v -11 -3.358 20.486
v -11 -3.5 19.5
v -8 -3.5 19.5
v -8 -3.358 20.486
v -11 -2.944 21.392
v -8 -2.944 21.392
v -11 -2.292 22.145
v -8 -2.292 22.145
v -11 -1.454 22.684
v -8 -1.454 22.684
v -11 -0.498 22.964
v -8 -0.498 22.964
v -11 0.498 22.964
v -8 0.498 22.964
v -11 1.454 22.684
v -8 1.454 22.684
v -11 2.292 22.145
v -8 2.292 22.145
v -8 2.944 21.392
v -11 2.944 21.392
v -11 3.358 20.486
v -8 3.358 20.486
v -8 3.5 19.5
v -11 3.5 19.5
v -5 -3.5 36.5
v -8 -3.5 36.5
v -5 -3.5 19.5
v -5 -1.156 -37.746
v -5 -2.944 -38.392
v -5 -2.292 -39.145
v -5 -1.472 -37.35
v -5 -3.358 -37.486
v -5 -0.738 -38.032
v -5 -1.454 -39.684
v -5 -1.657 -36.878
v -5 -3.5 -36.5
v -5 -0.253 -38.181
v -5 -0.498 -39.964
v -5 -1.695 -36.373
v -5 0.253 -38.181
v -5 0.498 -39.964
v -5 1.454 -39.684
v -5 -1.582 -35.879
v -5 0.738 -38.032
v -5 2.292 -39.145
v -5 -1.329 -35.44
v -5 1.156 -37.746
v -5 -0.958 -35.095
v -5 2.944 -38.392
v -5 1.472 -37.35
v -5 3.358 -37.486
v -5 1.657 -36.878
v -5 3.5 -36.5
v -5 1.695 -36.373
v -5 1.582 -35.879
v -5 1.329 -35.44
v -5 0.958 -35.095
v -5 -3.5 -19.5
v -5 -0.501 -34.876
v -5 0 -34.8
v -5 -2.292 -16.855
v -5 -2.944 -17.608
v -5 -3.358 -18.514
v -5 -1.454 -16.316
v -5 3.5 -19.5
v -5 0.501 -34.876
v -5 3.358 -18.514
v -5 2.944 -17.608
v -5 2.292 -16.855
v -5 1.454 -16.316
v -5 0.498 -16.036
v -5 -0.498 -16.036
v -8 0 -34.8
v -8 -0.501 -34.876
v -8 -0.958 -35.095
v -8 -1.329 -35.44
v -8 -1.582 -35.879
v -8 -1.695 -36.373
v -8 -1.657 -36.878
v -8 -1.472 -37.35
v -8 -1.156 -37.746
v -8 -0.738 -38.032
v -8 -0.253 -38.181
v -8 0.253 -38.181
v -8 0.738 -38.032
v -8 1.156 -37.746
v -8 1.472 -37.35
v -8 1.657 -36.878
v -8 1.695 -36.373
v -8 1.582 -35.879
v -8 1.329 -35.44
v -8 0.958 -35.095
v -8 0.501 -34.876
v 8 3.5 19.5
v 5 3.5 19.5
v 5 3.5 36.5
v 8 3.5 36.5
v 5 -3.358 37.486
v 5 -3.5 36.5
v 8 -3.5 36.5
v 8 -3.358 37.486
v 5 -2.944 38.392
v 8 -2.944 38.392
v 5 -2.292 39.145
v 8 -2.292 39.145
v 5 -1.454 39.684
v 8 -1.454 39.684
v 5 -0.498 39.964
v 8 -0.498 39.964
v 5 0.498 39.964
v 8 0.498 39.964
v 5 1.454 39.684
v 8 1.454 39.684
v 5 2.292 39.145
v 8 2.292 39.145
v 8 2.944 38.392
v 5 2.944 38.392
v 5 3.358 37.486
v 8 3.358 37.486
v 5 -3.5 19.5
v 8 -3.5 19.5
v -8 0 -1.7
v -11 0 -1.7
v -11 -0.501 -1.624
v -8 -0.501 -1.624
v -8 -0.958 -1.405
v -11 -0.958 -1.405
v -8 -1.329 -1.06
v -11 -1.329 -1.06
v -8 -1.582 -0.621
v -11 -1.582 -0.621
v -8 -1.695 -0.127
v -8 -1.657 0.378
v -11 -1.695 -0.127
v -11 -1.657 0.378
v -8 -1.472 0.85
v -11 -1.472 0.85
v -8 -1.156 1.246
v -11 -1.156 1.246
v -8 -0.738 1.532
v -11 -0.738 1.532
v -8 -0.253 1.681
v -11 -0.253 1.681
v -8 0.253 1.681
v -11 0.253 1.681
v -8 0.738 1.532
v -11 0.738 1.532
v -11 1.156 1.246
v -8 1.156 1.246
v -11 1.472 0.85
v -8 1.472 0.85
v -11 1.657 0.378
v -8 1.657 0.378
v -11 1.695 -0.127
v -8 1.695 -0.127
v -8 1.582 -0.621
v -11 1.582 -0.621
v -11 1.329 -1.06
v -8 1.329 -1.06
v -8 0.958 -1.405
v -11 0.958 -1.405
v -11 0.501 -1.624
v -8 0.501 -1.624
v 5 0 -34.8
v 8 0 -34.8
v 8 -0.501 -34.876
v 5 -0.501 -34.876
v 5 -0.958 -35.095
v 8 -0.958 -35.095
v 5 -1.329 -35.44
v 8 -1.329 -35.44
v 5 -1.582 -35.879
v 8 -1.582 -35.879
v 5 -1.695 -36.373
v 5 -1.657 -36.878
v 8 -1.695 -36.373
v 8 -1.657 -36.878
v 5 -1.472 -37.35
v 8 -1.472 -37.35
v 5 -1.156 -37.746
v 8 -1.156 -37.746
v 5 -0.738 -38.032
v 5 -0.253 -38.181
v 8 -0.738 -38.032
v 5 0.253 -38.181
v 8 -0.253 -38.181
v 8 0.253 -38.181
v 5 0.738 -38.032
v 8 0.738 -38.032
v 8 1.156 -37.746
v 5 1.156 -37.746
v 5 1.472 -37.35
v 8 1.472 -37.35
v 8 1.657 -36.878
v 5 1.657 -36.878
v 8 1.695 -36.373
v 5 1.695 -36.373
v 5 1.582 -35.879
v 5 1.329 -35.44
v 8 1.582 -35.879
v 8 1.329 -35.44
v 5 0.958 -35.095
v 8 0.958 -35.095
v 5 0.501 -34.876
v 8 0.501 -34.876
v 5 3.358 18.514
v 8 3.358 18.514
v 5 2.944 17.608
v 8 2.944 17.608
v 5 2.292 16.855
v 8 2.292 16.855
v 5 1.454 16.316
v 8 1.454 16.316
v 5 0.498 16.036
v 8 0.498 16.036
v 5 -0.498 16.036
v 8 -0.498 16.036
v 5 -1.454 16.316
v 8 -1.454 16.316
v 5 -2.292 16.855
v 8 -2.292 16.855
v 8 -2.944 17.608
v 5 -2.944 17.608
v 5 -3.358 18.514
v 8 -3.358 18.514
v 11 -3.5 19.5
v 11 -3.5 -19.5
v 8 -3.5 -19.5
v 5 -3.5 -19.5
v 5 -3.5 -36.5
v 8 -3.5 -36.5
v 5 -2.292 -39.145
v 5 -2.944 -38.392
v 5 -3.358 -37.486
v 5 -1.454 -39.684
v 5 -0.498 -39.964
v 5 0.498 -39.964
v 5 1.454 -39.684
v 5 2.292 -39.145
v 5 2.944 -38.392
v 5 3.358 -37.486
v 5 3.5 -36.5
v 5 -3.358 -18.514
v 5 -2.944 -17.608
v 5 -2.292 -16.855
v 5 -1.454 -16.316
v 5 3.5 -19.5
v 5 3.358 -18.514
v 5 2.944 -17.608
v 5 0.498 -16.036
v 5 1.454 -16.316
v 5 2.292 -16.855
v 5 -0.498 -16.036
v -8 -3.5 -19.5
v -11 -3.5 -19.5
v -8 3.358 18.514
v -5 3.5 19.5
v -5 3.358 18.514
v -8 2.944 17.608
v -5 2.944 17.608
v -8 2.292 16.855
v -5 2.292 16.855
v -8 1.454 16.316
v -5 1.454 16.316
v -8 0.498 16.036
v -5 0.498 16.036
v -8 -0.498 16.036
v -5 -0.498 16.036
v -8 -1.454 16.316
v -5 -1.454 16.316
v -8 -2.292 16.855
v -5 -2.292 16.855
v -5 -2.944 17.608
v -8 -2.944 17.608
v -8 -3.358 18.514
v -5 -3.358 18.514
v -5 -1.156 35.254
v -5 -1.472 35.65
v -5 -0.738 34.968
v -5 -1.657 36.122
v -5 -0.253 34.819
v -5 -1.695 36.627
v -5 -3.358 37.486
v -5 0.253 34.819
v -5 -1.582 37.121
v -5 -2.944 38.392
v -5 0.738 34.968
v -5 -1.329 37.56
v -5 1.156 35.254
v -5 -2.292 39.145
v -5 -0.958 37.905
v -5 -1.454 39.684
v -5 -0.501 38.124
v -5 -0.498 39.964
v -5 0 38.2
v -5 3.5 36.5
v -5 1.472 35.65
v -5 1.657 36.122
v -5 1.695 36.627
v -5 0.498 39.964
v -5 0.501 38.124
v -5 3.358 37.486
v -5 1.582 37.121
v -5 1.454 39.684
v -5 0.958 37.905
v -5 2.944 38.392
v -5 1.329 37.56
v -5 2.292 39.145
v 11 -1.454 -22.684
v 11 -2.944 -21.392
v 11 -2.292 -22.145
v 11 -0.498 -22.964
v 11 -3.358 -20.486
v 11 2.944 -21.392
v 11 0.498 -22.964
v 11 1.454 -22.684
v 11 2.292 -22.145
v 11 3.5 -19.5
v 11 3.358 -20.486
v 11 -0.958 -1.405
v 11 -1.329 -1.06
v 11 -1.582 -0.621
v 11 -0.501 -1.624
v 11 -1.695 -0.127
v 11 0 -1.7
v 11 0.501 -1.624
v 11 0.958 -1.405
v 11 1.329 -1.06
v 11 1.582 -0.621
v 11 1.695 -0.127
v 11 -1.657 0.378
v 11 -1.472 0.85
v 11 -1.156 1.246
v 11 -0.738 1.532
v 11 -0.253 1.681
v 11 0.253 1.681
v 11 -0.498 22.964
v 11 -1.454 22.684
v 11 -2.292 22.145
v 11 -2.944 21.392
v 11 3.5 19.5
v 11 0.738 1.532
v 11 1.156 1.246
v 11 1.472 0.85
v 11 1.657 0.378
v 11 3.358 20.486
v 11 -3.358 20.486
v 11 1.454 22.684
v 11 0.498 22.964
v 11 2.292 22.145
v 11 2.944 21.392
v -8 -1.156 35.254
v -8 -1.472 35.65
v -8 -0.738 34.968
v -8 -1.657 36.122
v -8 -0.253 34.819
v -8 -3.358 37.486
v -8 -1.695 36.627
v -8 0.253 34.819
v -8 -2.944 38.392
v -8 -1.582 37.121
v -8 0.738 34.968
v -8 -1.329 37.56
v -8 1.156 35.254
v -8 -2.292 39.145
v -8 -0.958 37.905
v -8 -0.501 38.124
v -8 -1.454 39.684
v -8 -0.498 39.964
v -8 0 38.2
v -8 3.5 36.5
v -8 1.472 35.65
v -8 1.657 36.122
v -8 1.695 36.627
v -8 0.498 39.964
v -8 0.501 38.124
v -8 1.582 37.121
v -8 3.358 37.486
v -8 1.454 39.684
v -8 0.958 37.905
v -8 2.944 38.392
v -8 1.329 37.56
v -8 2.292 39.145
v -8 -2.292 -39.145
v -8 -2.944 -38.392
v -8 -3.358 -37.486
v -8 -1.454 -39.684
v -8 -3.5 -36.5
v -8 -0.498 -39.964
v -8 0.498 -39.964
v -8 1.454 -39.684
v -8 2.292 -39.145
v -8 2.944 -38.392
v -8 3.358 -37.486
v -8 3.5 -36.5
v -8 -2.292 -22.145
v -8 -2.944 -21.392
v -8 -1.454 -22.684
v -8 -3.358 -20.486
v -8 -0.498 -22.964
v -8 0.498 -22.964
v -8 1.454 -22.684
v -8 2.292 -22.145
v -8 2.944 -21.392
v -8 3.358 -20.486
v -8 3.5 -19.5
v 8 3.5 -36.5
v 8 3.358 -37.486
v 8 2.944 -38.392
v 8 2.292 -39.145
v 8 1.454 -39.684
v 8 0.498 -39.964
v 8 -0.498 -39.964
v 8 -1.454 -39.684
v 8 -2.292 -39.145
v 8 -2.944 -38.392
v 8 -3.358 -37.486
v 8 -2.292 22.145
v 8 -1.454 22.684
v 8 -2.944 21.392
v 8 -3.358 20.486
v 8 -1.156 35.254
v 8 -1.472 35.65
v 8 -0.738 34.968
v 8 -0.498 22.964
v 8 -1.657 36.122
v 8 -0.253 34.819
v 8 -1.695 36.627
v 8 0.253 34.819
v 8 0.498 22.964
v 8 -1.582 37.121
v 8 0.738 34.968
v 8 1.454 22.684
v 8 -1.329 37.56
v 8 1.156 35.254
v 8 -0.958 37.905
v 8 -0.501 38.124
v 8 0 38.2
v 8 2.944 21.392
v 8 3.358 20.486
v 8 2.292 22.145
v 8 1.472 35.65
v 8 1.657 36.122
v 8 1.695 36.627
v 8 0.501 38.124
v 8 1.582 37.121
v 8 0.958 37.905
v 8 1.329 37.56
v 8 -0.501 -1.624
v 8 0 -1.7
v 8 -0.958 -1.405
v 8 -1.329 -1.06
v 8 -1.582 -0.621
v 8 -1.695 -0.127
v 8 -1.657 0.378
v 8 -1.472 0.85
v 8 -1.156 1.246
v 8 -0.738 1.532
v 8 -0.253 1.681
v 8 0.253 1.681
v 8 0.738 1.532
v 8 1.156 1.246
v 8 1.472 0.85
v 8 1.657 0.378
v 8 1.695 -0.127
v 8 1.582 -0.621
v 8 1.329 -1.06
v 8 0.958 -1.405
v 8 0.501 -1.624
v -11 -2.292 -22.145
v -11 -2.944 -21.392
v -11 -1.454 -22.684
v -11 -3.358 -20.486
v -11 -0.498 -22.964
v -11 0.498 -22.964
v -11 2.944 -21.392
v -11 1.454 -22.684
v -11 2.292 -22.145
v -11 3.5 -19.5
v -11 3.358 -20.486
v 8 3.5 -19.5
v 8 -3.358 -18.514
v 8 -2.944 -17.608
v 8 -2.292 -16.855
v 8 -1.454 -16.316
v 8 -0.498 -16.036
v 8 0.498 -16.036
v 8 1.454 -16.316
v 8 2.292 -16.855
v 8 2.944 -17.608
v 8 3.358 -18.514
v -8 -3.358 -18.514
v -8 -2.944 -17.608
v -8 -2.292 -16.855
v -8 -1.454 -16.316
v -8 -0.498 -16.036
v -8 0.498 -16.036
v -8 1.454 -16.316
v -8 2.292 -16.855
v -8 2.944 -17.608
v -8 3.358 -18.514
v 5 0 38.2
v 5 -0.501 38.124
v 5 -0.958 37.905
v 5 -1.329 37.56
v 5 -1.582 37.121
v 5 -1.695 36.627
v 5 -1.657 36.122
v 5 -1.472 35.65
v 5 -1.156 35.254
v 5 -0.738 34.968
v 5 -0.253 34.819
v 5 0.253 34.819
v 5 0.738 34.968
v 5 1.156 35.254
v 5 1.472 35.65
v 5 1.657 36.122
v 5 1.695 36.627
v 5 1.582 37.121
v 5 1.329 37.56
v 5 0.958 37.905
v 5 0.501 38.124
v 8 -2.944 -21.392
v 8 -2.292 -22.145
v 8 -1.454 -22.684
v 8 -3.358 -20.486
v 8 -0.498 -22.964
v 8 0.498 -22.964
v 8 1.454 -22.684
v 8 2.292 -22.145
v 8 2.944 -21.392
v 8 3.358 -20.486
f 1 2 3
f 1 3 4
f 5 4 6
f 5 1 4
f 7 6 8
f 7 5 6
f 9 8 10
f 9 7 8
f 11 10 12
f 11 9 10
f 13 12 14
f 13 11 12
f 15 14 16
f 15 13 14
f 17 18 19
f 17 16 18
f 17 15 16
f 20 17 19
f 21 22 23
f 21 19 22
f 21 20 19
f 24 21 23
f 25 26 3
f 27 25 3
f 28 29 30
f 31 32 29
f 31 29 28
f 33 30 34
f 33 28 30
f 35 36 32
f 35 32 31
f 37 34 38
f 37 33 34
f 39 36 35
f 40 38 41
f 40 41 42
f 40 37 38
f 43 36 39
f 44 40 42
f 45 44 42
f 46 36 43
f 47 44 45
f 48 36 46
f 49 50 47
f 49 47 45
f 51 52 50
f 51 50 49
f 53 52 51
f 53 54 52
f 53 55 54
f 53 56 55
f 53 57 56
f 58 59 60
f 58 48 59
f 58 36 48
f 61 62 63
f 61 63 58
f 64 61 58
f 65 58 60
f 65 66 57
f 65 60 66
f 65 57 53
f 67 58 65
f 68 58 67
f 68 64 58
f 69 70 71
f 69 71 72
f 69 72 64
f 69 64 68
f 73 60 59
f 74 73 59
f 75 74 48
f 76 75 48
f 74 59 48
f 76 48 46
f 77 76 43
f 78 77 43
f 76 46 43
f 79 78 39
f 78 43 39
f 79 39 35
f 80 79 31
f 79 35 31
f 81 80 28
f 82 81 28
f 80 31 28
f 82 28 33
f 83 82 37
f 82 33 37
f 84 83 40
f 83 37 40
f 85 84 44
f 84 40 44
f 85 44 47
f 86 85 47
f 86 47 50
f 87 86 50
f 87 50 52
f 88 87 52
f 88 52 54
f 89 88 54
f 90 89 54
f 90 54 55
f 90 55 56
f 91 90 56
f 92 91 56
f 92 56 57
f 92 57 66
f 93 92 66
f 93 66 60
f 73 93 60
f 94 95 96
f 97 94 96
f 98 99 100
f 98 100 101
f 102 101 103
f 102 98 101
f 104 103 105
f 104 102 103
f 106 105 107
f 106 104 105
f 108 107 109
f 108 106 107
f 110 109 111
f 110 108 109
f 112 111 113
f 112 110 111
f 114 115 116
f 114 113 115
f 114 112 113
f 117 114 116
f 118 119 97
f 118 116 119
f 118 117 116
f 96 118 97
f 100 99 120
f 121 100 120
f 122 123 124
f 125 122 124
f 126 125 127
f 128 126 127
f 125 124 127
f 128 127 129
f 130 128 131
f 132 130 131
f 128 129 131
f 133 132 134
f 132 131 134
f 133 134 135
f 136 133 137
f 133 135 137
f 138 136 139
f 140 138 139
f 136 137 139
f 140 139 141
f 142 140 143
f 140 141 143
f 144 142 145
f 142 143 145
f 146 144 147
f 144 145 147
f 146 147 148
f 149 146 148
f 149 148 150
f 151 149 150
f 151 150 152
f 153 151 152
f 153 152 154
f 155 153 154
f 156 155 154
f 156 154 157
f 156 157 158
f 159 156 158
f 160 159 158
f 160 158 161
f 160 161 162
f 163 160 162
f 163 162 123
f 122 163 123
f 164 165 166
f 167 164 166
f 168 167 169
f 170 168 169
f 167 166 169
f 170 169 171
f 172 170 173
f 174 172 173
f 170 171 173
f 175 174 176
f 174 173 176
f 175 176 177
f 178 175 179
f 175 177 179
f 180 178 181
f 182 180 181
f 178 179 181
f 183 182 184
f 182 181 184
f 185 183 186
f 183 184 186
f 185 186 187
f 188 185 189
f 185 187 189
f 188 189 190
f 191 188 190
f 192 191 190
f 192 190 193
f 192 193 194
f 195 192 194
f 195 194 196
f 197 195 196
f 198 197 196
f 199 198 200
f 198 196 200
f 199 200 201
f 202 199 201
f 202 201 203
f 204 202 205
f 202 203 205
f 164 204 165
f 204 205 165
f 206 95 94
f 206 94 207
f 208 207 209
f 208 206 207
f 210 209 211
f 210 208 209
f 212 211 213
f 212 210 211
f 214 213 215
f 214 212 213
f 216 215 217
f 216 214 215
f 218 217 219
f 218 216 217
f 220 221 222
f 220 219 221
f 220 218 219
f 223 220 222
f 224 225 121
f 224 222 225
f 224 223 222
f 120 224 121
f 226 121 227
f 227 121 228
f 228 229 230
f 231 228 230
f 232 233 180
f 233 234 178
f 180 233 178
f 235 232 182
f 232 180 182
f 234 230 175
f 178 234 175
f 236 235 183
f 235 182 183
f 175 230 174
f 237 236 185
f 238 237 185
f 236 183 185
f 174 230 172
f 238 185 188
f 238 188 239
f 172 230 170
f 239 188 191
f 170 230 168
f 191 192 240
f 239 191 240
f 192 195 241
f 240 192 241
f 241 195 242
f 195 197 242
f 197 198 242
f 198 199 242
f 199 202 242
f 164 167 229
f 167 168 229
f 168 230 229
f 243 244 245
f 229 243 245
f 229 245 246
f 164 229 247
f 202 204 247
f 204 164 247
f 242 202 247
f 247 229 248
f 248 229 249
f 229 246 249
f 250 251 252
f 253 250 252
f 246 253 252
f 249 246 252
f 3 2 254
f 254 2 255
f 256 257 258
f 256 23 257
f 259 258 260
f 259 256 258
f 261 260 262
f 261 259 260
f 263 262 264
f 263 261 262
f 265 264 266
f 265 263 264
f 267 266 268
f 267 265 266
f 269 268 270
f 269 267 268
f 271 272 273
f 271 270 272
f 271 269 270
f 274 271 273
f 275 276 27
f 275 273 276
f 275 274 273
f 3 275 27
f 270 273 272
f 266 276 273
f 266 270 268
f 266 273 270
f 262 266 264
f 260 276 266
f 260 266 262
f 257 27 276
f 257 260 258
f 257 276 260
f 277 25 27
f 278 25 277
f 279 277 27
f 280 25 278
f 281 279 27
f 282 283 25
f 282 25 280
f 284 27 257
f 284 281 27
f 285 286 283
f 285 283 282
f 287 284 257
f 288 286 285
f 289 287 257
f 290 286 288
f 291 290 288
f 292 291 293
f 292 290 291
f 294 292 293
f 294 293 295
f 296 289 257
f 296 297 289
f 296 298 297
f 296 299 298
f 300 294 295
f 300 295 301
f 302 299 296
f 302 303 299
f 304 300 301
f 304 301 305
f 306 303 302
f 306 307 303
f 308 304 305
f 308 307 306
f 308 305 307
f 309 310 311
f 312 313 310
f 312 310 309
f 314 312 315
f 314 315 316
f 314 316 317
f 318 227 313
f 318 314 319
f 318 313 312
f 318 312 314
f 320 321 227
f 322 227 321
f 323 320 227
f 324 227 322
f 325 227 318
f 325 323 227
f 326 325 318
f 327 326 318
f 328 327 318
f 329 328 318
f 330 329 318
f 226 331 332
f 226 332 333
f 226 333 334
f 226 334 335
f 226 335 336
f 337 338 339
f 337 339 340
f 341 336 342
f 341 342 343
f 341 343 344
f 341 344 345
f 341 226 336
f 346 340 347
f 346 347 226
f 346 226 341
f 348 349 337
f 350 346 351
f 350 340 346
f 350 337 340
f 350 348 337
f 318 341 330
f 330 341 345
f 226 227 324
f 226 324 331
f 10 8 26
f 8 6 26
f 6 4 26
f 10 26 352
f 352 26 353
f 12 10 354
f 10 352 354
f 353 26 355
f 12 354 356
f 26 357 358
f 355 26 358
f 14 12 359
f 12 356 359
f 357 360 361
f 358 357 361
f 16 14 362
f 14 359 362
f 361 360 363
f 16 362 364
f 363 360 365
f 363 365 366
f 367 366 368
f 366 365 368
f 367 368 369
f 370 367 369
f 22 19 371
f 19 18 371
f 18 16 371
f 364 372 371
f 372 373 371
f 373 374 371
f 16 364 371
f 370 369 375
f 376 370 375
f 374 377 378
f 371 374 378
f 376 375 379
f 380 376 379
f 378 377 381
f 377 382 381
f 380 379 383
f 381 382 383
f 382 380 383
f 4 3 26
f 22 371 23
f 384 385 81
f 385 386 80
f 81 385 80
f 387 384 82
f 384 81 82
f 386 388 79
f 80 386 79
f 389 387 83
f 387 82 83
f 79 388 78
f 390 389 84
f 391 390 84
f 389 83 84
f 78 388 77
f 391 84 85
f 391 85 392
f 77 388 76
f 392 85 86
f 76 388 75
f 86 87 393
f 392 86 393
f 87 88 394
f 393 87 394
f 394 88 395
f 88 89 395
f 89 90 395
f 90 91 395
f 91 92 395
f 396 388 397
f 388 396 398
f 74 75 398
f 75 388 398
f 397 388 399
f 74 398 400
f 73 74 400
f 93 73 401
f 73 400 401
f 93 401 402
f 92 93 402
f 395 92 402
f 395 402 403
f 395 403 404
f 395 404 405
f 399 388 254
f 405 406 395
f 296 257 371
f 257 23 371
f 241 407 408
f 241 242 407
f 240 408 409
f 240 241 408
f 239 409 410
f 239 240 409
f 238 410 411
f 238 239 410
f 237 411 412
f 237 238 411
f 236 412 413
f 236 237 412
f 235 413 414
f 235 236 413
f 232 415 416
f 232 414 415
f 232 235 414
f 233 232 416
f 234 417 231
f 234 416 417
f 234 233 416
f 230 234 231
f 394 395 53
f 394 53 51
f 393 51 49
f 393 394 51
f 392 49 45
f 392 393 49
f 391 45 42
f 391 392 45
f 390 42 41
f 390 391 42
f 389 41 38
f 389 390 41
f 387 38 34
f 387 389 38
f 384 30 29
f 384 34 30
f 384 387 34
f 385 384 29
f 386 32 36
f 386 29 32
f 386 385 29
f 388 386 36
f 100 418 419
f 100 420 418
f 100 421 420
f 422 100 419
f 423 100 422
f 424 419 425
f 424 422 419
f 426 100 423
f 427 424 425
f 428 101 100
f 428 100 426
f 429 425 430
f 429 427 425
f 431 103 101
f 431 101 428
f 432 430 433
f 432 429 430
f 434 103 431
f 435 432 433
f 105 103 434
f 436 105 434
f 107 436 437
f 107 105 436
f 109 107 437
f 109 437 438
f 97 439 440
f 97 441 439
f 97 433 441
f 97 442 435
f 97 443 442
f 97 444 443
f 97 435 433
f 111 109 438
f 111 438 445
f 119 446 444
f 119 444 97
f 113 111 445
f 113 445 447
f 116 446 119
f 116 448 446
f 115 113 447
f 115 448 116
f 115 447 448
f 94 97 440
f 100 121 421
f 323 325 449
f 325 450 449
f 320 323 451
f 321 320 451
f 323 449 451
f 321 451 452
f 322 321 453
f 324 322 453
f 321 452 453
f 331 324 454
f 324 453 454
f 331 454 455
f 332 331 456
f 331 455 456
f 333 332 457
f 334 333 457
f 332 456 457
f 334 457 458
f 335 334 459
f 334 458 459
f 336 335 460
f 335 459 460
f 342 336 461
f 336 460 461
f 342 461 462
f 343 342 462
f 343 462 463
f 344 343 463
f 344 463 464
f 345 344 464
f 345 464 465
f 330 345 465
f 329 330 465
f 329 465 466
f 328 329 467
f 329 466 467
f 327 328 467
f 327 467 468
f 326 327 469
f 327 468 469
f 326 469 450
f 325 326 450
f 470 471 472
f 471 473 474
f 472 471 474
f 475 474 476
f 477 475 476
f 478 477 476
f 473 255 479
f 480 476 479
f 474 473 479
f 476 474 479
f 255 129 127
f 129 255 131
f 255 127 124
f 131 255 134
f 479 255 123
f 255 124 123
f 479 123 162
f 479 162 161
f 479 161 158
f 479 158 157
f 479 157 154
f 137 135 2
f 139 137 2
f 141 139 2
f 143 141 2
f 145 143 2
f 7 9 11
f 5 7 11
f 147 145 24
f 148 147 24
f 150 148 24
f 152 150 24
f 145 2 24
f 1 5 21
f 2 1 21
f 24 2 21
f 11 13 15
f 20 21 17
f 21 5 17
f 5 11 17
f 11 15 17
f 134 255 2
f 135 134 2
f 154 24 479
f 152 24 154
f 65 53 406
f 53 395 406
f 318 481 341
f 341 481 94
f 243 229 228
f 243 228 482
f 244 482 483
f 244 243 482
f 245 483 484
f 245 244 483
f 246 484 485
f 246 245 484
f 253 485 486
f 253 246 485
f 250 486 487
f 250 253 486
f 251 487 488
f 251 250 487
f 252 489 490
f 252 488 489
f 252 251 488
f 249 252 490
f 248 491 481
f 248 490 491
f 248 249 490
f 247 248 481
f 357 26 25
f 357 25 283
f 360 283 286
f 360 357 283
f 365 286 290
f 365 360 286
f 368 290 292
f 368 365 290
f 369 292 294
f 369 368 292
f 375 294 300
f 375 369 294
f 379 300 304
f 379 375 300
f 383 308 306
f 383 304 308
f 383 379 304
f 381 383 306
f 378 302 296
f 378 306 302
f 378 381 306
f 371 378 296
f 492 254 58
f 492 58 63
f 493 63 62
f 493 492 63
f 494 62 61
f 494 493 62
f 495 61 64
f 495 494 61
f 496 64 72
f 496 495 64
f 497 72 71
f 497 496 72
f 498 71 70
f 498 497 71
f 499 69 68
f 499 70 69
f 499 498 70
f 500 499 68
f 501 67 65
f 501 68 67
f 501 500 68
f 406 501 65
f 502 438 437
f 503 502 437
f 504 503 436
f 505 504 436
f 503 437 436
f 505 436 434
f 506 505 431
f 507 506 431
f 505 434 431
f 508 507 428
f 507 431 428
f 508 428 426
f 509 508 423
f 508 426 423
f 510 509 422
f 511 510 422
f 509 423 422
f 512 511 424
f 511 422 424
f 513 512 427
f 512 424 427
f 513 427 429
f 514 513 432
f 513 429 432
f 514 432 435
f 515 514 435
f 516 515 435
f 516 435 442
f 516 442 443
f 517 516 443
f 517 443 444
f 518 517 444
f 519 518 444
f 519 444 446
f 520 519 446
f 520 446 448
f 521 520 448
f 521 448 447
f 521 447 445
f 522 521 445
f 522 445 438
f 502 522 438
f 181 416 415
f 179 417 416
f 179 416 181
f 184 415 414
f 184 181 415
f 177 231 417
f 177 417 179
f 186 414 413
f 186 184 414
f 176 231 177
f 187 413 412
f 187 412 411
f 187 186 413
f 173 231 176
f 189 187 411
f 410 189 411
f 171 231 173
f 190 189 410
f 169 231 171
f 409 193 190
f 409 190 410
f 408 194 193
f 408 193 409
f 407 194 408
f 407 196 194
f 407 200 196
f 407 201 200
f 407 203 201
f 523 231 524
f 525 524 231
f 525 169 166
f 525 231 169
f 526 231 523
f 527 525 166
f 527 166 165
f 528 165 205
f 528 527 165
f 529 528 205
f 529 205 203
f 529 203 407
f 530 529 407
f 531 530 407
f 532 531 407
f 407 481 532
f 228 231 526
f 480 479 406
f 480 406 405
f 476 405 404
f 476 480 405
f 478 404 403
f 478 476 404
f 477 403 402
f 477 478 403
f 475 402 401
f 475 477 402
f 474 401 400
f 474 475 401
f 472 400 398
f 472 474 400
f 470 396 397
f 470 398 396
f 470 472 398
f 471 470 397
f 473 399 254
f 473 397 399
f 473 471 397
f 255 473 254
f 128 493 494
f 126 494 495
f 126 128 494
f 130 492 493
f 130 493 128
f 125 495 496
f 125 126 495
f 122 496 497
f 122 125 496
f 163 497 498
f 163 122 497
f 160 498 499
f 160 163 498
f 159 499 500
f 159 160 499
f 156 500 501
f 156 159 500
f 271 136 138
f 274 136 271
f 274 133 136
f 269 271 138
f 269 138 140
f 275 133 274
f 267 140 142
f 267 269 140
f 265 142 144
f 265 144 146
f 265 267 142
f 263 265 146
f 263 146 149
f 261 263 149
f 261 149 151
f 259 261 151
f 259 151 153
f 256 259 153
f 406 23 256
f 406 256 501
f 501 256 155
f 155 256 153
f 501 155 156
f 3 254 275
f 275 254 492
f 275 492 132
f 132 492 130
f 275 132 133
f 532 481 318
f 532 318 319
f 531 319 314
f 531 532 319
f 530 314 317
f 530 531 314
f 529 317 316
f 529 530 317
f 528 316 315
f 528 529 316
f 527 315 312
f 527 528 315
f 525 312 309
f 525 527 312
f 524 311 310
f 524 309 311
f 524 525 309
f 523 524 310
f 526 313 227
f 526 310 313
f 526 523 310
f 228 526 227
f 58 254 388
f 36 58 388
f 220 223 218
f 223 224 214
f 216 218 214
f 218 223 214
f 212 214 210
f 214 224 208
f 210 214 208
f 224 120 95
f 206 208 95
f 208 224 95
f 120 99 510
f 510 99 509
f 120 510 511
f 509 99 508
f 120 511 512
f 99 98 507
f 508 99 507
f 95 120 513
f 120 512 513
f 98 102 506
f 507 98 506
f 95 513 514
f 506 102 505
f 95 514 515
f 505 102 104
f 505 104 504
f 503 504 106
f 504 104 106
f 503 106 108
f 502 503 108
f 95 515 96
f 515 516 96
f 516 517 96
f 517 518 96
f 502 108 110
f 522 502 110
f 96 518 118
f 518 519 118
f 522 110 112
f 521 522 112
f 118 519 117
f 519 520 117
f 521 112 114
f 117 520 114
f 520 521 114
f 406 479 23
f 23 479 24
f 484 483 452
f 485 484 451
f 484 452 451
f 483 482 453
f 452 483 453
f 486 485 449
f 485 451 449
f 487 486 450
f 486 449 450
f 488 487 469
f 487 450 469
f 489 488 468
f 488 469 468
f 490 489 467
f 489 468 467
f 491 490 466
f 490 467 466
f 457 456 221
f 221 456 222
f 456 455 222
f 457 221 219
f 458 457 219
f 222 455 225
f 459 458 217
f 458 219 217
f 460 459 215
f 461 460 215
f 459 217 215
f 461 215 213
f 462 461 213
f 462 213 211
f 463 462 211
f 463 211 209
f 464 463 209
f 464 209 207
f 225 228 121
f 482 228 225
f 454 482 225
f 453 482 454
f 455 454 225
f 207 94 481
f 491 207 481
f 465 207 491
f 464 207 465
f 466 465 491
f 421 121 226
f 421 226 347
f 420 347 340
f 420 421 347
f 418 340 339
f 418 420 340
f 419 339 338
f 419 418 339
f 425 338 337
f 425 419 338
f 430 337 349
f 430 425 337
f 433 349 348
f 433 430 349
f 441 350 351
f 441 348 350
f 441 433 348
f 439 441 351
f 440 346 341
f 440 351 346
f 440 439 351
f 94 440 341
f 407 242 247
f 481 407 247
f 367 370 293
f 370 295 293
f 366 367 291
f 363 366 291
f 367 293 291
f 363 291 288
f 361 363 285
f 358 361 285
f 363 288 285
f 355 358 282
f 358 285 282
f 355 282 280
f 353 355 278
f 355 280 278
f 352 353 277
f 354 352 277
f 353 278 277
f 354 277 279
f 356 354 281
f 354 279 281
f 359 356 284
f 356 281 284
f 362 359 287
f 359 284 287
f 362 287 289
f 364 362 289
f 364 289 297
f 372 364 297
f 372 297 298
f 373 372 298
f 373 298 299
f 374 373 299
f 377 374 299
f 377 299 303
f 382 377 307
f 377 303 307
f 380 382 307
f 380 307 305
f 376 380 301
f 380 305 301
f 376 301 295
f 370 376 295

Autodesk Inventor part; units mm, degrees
ref_plane "YZ Plane" through (0, 0, 0) normal (1, 0, 0) x (0, 1, 0)
ref_plane "XZ Plane" through (0, 0, 0) normal (0, 1, 0) x (-1, 0, 0)
ref_plane "XY Plane" through (0, 0, 0) normal (0, 0, 1) x (1, 0, 0)
sketch "Sketch1" plane through (0, 0, 0) normal (1, 0, 0) x (0, 1, 0)
  line L0 (0, -36.5) -> (0, 36.5) construction
  line L1 (3.5, -36.5) -> (3.5, 36.5)
  line L2 (-3.5, 36.5) -> (-3.5, -36.5)
  arc A0 (-3.5, -36.5) -> (3.5, -36.5) centre (0, -36.5) ccw
  arc A1 (3.5, 36.5) -> (-3.5, 36.5) centre (0, 36.5) ccw
  circle A2 centre (0, 36.5) radius 1.5
  circle A3 centre (0, 0) radius 1.5
  circle A4 centre (0, -36.5) radius 1.5
  line L3 (0, -19.5) -> (0, 19.5) construction
  line L4 (3.5, -19.5) -> (3.5, 19.5)
  line L5 (-3.5, 19.5) -> (-3.5, -19.5)
  arc A5 (-3.5, -19.5) -> (3.5, -19.5) centre (0, -19.5) ccw
  arc A6 (3.5, 19.5) -> (-3.5, 19.5) centre (0, 19.5) ccw
  line L6 (0, -36.5) -> (0, -19.5) construction
  line L7 (-3.5, -36.5) -> (-3.5, -19.5)
  line L8 (3.5, -19.5) -> (3.5, -36.5)
  arc A7 (-3.5, -36.5) -> (3.5, -36.5) centre (0, -36.5) ccw
  arc A8 (3.5, -19.5) -> (-3.5, -19.5) centre (0, -19.5) ccw
  line L9 (3.5, 0) -> (-3.5, 0) construction
  line L10 (0, 36.5) -> (0, 19.5) construction
  line L11 (-3.5, 36.5) -> (-3.5, 19.5)
  line L12 (3.5, 19.5) -> (3.5, 36.5)
  arc A9 (3.5, 36.5) -> (-3.5, 36.5) centre (0, 36.5) ccw
  arc A10 (-3.5, 19.5) -> (3.5, 19.5) centre (0, 19.5) ccw
  point P0 (0, -40)
  point P1 (0, 40)
  point P2 (3.5, 19.5)
  point P3 (-3.5, 19.5)
  point P4 (3.5, -19.5)
  point P5 (0, -28)
  point P6 (0, 28)
  point P7 (3.5, 19.5)
  point P8 (-3.5, 19.5)
  point P9 (-3.5, -19.5)
  point P10 (3.5, -19.5)
  dimension "d18" = 80
  dimension "d19" = 3
  dimension "d20" = 7
  dimension "d32" = 39
extrude "Extrusión3" add sketch "Sketch1" along normal mid plane 22 contours A8 L2 A10 L1 | A5 A8 | A10 A6 | A3
extrude "Extrusión4" cut sketch "Sketch1" along normal mid plane 16 contours A8 L2 A10 L1 | A5 A8 | A10 A6 | A3
extrude "Extrusión5" add sketch "Sketch1" along normal mid plane 16 contours A0 L2 A5 L1 | A5 A8 | A6 L2 A1 L1 | A10 A6 | A2 | A4
extrude "Extrusión6" cut sketch "Sketch1" along normal mid plane 10 contours A0 L2 A5 L1 | A5 A8 | A6 L2 A1 L1 | A10 A6 | A2 | A4
sketch "Boceto2" plane through (-8, 0, 0) normal (-1, 0, 0) x (0, 0, 1)
  point P0 (-36.5, 0)
  point P1 (36.5, 0)
hole "Agujero1" at (-8, 0, -36.5) at (-8, 0, 36.5) direction (1, 0, 0) diameter 3.4 end through all clearance for "Tornillo de cabeza plana avellanada ISO 2009/7046" size "M3" standard "ISO"
sketch "Boceto3" plane through (11, 0, 0) normal (1, 0, 0) x (0, 0, -1)
  point P0 (0, 0)
  point P1 (0, 0)
hole "Agujero2" at (11, 0, 0) direction (-1, 0, 0) diameter 3.4 end through all clearance for "Tornillo de cabeza plana avellanada ISO 2009/7046" size "M3" standard "ISO"
equation "\"d35\" = Dedos"
equation "\"Dedos\" = 10"
properties part number "Corredera I" material "Aluminio 6061"
